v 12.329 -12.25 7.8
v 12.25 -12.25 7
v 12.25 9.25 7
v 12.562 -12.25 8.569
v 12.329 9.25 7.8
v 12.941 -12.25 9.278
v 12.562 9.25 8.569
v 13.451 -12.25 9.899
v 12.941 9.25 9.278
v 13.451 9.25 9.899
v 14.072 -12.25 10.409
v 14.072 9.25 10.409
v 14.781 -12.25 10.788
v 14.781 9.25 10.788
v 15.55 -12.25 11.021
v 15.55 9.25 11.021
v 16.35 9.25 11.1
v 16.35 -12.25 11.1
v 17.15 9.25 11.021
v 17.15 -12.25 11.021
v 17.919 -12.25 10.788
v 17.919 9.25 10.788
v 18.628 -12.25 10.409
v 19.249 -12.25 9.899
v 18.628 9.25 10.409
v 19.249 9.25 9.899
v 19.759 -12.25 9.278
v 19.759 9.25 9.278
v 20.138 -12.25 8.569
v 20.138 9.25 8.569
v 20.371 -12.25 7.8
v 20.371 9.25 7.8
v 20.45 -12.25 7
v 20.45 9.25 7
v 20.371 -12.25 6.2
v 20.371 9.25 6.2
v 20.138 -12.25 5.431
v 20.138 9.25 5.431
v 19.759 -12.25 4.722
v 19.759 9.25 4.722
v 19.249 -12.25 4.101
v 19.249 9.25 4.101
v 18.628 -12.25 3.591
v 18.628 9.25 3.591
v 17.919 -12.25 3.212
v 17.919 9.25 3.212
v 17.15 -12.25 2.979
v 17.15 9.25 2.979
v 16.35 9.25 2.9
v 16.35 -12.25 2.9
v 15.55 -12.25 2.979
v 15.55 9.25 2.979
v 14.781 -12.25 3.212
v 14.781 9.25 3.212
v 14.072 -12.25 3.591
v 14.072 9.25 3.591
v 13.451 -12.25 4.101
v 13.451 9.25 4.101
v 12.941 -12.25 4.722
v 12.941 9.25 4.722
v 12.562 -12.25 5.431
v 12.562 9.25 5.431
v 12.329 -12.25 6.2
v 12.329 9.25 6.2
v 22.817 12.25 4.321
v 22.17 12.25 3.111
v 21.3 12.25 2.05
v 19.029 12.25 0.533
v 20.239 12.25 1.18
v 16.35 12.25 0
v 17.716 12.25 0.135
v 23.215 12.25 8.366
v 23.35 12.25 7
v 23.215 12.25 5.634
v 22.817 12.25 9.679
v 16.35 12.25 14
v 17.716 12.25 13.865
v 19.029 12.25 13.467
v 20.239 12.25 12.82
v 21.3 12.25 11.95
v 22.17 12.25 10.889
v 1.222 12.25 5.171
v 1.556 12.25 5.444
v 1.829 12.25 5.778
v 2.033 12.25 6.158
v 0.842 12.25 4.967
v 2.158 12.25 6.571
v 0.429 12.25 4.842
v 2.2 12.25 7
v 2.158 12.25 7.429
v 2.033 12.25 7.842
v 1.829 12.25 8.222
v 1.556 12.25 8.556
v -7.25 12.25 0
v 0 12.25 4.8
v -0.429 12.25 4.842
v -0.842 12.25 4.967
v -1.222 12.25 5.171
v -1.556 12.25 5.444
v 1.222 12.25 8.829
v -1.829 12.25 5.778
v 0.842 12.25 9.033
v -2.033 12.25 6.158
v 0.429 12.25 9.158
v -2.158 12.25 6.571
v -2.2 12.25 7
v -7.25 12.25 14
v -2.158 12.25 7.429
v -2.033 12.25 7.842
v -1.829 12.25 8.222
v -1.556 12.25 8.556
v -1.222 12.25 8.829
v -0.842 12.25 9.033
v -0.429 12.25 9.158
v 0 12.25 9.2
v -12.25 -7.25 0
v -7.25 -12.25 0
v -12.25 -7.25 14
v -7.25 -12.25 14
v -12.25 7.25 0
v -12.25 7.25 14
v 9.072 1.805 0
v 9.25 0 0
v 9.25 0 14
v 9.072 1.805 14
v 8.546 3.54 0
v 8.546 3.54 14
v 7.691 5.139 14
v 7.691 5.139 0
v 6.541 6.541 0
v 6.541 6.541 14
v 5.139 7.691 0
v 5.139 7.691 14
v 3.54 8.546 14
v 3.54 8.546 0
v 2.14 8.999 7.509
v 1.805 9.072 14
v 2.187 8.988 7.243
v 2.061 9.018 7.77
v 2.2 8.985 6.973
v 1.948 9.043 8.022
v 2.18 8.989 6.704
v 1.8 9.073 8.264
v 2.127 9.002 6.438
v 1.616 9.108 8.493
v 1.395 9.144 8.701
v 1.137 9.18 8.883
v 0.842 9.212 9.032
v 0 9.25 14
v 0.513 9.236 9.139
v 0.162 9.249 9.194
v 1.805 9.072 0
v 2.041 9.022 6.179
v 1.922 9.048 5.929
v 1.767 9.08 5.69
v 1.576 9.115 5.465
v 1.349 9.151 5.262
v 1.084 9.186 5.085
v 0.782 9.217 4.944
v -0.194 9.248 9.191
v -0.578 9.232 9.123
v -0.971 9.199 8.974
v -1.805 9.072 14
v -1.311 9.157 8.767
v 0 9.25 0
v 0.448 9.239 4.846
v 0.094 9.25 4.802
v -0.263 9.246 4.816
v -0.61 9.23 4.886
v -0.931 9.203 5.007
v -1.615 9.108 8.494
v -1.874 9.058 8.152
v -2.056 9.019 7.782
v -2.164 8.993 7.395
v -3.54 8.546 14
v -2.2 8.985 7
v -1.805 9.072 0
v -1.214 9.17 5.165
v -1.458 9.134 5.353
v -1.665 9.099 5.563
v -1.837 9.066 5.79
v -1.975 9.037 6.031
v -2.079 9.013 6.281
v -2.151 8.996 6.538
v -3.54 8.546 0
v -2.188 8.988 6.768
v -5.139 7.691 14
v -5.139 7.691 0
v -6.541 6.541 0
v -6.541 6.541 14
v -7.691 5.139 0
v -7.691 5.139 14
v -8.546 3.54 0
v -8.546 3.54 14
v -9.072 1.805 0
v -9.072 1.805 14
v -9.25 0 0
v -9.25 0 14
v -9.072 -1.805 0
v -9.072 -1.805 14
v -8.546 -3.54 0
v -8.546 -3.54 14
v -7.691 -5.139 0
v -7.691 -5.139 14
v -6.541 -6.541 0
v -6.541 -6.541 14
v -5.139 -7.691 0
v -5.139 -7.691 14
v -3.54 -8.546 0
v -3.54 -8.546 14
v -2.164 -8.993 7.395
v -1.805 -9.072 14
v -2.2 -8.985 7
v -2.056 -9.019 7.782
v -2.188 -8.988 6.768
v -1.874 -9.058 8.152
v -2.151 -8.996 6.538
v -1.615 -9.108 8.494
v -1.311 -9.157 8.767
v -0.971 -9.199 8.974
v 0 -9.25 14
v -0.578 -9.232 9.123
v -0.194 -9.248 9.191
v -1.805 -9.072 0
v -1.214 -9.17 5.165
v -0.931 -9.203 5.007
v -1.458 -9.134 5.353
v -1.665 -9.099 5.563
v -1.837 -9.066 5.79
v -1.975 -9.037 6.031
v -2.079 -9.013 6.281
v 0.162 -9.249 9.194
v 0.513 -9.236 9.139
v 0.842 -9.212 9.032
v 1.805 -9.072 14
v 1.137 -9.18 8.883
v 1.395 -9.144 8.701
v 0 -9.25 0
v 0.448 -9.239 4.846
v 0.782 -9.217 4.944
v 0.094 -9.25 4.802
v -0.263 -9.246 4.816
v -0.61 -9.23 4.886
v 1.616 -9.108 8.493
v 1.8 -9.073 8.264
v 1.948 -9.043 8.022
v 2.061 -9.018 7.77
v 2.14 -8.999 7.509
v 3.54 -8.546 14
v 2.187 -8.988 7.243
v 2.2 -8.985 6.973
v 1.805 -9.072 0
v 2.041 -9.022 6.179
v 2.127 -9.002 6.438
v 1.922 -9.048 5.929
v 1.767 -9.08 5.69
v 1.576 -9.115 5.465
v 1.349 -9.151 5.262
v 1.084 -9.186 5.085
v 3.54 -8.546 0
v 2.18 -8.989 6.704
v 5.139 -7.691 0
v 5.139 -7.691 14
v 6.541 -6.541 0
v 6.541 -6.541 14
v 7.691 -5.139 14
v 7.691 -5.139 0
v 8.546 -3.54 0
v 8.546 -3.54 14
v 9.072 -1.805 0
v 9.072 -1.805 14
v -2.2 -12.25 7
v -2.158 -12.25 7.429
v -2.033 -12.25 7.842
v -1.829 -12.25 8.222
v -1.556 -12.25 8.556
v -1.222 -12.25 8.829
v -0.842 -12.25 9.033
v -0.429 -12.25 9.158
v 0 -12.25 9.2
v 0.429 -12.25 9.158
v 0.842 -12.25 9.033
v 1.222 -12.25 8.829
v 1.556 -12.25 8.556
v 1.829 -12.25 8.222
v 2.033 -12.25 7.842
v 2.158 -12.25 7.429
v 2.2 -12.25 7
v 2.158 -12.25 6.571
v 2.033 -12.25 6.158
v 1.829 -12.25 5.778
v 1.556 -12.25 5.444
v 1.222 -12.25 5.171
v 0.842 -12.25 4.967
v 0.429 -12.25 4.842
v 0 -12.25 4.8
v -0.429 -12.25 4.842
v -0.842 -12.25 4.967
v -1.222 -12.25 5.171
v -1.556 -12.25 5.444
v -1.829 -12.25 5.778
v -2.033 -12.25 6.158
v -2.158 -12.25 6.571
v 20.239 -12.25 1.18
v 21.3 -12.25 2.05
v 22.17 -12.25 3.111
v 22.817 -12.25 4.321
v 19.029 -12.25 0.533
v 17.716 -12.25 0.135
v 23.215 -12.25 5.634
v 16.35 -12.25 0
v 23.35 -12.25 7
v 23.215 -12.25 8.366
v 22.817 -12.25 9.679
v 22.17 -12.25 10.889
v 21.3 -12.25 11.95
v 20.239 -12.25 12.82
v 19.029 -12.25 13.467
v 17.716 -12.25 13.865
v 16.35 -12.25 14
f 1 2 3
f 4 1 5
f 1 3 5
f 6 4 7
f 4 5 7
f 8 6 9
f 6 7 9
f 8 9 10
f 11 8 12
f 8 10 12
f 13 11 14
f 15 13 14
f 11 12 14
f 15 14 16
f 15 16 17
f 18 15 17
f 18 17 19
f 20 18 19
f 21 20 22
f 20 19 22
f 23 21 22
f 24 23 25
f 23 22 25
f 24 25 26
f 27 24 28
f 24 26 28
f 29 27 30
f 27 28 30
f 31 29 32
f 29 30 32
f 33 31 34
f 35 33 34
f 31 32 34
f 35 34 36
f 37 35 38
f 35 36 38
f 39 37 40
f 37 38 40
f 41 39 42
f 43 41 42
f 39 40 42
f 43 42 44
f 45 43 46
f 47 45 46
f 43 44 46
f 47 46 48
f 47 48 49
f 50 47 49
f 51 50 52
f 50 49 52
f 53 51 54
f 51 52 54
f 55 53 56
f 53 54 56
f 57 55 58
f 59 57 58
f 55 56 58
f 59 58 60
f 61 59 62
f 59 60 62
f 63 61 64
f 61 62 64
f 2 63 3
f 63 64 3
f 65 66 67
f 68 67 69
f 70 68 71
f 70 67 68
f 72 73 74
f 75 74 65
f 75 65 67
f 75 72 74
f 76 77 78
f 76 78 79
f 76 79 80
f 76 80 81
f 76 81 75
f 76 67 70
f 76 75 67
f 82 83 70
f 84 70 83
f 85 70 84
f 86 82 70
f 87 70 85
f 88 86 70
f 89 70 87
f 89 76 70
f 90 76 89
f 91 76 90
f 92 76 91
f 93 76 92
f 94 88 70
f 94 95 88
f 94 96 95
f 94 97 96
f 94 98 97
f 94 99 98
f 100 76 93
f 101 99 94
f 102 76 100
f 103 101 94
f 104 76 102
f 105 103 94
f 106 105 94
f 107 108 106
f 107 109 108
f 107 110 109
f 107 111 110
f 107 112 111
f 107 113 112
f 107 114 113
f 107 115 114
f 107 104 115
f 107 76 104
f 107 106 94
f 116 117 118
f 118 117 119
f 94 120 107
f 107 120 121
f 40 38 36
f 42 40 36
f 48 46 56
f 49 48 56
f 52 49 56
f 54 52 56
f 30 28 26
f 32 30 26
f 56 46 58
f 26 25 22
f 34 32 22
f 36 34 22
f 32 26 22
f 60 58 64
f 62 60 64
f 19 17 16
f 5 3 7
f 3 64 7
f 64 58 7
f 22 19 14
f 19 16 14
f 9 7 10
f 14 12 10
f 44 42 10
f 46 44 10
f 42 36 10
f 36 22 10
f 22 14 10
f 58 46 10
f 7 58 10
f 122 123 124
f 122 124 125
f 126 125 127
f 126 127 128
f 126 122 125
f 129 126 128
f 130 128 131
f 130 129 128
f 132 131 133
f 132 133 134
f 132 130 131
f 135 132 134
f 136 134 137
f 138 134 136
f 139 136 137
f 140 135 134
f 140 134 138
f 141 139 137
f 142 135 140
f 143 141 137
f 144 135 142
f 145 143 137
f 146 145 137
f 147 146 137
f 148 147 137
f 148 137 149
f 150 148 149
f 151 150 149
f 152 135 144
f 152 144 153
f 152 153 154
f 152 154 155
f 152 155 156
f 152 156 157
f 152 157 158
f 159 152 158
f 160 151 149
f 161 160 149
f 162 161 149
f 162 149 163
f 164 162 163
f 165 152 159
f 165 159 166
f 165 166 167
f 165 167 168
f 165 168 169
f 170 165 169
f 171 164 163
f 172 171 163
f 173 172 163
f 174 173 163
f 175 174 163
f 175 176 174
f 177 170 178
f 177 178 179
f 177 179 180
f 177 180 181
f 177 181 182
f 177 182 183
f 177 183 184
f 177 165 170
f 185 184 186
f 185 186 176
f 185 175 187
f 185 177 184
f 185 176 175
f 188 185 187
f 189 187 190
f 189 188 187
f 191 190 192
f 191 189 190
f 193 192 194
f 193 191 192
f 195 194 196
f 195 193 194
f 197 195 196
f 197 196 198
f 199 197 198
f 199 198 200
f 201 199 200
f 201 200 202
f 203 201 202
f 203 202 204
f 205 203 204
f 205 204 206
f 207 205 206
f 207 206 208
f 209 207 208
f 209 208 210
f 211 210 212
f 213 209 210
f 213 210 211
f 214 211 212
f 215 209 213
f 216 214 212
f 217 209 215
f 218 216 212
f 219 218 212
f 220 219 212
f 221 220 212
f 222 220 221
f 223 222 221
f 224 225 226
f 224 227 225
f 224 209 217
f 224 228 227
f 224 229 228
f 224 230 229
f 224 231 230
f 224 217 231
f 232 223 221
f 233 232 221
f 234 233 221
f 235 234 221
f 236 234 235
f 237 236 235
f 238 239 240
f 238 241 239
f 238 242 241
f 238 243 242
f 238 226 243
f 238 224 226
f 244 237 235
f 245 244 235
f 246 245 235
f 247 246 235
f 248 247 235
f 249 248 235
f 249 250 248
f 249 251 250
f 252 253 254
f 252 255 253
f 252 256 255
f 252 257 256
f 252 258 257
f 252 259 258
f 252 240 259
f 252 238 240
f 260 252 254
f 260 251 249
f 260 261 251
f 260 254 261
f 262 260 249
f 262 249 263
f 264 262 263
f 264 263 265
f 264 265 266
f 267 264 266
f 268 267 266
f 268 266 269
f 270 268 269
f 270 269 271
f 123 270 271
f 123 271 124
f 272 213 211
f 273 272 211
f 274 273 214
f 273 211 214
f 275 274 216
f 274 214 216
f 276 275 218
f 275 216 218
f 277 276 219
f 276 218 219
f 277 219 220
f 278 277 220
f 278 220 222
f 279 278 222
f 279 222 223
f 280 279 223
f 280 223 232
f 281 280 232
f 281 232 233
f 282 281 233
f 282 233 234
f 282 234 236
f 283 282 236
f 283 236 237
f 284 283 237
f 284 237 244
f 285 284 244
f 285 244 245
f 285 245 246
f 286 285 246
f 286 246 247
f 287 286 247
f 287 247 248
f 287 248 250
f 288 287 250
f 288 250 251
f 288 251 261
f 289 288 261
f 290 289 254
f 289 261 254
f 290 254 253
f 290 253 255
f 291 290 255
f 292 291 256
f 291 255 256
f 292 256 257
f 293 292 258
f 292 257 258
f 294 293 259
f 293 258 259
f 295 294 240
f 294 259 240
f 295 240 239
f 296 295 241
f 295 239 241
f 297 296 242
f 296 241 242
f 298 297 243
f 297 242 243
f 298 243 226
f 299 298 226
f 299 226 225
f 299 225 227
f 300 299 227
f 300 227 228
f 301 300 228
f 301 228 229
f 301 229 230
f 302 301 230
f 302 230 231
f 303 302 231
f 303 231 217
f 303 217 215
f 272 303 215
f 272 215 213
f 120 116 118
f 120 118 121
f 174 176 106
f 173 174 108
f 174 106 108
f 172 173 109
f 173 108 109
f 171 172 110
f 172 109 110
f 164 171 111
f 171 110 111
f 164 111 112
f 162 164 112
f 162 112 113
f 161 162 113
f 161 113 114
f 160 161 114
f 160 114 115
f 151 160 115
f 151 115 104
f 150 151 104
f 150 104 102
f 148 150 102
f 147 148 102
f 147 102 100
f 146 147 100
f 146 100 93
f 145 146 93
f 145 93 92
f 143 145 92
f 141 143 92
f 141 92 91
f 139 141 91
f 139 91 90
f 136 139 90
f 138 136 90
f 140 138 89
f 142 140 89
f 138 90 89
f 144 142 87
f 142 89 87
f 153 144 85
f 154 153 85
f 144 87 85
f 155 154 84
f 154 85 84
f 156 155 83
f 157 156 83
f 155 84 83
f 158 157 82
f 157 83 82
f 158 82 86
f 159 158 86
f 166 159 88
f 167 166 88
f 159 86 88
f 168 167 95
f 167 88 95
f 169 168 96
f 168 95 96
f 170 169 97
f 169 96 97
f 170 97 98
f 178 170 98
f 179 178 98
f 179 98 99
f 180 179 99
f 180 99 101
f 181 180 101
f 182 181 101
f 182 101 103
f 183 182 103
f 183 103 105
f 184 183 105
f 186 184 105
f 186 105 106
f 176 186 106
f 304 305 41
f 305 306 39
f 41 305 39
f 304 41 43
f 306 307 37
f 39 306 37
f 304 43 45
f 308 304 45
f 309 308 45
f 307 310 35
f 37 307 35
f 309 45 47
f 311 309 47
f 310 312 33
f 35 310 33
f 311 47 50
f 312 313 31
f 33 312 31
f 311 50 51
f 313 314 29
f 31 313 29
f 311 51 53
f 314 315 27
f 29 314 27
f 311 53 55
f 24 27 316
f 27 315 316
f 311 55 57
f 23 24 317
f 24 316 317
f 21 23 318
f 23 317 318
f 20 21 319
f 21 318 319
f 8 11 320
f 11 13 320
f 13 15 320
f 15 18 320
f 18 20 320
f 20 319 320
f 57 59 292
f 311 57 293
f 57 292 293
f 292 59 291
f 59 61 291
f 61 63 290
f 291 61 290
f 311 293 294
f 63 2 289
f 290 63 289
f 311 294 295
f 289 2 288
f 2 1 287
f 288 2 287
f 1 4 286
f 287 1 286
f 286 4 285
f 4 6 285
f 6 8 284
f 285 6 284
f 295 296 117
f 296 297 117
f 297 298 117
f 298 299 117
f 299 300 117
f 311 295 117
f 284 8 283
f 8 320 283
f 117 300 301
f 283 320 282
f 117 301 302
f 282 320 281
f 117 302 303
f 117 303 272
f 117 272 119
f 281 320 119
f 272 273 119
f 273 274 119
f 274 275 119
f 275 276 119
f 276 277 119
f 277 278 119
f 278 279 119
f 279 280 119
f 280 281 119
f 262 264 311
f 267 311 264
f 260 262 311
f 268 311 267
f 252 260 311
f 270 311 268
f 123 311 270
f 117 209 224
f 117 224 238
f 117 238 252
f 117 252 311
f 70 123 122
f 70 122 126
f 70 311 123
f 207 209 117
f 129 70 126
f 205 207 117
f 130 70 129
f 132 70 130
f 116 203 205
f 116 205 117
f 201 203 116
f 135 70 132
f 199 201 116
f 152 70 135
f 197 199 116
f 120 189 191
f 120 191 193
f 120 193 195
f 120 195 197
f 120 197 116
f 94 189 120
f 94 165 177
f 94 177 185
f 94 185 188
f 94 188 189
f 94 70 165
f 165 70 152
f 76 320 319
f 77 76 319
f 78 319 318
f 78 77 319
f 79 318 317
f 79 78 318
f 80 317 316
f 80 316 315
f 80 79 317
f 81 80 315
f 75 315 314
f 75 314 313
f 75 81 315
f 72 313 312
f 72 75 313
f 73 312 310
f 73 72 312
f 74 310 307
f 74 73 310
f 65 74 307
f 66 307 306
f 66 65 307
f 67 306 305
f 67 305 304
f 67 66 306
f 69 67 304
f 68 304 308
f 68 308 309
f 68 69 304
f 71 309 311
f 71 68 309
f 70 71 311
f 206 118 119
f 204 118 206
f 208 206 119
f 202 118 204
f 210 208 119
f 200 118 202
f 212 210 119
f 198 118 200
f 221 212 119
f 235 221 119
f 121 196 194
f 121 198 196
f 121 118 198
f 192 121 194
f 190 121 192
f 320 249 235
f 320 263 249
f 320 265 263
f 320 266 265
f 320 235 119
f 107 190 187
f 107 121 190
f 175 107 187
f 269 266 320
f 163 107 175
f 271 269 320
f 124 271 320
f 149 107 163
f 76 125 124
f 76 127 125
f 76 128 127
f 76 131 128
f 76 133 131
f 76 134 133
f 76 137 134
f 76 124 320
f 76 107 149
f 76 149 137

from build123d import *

# Parameters (mm, degrees)
F0_W     = 24.5
F0_H     = 24.5
F0_R     = 9.25
F1_DEPTH = 14
F2_R     = 2.2
F3_DEPTH = 24.5
F2_R_2   = 4.1
F4_DEPTH = 24.5
F5_START = -3
F5_DEPTH = 21.5
F6_SIZE  = 5


# Not quite as in the source:
# - a feature of the source that left no trace in its solid (it failed there, or was rolled back) is left out


with BuildPart() as f1:
    # F0 (on Top) → F1 (new body)
    with BuildSketch(Plane.XY):
        Rectangle(F0_W, F0_H)
        Circle(F0_R, mode=Mode.SUBTRACT)
    extrude(amount=F1_DEPTH)

    # F2 (on face) → F3 (cut, through all)
    with BuildSketch(Plane(origin=(0, 12.25, 0), x_dir=(-1, 0, 0), z_dir=(0, 1, 0))):
        with Locations((0, 7)):
            Circle(F2_R)
    extrude(amount=-F3_DEPTH, mode=Mode.SUBTRACT)

    # F2 (on face) → F4 (join, through all)
    with BuildSketch(Plane(origin=(0, 12.25, 0), x_dir=(-1, 0, 0), z_dir=(0, 1, 0))):
        with BuildLine():
            Line((-12.25, 7), (-12.25, 14))
            Line((-12.25, 14), (-16.35, 14))
            ThreePointArc((-16.35, 14), (-23.35, 7), (-16.35, 0))
            Line((-16.35, 0), (-12.25, 0))
            Line((-12.25, 0), (-12.25, 7))
        make_face()
        with Locations((-16.35, 7)):
            Circle(F2_R_2, mode=Mode.SUBTRACT)
        with Locations((-16.35, 7)):
            Circle(F2_R_2)
    extrude(amount=-F4_DEPTH)

    # F2 (on face) → F5 (cut)
    with BuildSketch(Plane(origin=(0, 12.25, 0), x_dir=(-1, 0, 0), z_dir=(0, 1, 0)).offset(F5_START)):
        with Locations((-16.35, 7)):
            Circle(F2_R_2)
    extrude(amount=-F5_DEPTH, mode=Mode.SUBTRACT)

    # F6
    f6_edges = [f1.edges().sort_by_distance(p)[0] for p in [
        (-12.25, 12.25, 7),
        (-12.25, -12.25, 7),
    ]]
    chamfer(f6_edges, length=F6_SIZE)


solid = f1.part
